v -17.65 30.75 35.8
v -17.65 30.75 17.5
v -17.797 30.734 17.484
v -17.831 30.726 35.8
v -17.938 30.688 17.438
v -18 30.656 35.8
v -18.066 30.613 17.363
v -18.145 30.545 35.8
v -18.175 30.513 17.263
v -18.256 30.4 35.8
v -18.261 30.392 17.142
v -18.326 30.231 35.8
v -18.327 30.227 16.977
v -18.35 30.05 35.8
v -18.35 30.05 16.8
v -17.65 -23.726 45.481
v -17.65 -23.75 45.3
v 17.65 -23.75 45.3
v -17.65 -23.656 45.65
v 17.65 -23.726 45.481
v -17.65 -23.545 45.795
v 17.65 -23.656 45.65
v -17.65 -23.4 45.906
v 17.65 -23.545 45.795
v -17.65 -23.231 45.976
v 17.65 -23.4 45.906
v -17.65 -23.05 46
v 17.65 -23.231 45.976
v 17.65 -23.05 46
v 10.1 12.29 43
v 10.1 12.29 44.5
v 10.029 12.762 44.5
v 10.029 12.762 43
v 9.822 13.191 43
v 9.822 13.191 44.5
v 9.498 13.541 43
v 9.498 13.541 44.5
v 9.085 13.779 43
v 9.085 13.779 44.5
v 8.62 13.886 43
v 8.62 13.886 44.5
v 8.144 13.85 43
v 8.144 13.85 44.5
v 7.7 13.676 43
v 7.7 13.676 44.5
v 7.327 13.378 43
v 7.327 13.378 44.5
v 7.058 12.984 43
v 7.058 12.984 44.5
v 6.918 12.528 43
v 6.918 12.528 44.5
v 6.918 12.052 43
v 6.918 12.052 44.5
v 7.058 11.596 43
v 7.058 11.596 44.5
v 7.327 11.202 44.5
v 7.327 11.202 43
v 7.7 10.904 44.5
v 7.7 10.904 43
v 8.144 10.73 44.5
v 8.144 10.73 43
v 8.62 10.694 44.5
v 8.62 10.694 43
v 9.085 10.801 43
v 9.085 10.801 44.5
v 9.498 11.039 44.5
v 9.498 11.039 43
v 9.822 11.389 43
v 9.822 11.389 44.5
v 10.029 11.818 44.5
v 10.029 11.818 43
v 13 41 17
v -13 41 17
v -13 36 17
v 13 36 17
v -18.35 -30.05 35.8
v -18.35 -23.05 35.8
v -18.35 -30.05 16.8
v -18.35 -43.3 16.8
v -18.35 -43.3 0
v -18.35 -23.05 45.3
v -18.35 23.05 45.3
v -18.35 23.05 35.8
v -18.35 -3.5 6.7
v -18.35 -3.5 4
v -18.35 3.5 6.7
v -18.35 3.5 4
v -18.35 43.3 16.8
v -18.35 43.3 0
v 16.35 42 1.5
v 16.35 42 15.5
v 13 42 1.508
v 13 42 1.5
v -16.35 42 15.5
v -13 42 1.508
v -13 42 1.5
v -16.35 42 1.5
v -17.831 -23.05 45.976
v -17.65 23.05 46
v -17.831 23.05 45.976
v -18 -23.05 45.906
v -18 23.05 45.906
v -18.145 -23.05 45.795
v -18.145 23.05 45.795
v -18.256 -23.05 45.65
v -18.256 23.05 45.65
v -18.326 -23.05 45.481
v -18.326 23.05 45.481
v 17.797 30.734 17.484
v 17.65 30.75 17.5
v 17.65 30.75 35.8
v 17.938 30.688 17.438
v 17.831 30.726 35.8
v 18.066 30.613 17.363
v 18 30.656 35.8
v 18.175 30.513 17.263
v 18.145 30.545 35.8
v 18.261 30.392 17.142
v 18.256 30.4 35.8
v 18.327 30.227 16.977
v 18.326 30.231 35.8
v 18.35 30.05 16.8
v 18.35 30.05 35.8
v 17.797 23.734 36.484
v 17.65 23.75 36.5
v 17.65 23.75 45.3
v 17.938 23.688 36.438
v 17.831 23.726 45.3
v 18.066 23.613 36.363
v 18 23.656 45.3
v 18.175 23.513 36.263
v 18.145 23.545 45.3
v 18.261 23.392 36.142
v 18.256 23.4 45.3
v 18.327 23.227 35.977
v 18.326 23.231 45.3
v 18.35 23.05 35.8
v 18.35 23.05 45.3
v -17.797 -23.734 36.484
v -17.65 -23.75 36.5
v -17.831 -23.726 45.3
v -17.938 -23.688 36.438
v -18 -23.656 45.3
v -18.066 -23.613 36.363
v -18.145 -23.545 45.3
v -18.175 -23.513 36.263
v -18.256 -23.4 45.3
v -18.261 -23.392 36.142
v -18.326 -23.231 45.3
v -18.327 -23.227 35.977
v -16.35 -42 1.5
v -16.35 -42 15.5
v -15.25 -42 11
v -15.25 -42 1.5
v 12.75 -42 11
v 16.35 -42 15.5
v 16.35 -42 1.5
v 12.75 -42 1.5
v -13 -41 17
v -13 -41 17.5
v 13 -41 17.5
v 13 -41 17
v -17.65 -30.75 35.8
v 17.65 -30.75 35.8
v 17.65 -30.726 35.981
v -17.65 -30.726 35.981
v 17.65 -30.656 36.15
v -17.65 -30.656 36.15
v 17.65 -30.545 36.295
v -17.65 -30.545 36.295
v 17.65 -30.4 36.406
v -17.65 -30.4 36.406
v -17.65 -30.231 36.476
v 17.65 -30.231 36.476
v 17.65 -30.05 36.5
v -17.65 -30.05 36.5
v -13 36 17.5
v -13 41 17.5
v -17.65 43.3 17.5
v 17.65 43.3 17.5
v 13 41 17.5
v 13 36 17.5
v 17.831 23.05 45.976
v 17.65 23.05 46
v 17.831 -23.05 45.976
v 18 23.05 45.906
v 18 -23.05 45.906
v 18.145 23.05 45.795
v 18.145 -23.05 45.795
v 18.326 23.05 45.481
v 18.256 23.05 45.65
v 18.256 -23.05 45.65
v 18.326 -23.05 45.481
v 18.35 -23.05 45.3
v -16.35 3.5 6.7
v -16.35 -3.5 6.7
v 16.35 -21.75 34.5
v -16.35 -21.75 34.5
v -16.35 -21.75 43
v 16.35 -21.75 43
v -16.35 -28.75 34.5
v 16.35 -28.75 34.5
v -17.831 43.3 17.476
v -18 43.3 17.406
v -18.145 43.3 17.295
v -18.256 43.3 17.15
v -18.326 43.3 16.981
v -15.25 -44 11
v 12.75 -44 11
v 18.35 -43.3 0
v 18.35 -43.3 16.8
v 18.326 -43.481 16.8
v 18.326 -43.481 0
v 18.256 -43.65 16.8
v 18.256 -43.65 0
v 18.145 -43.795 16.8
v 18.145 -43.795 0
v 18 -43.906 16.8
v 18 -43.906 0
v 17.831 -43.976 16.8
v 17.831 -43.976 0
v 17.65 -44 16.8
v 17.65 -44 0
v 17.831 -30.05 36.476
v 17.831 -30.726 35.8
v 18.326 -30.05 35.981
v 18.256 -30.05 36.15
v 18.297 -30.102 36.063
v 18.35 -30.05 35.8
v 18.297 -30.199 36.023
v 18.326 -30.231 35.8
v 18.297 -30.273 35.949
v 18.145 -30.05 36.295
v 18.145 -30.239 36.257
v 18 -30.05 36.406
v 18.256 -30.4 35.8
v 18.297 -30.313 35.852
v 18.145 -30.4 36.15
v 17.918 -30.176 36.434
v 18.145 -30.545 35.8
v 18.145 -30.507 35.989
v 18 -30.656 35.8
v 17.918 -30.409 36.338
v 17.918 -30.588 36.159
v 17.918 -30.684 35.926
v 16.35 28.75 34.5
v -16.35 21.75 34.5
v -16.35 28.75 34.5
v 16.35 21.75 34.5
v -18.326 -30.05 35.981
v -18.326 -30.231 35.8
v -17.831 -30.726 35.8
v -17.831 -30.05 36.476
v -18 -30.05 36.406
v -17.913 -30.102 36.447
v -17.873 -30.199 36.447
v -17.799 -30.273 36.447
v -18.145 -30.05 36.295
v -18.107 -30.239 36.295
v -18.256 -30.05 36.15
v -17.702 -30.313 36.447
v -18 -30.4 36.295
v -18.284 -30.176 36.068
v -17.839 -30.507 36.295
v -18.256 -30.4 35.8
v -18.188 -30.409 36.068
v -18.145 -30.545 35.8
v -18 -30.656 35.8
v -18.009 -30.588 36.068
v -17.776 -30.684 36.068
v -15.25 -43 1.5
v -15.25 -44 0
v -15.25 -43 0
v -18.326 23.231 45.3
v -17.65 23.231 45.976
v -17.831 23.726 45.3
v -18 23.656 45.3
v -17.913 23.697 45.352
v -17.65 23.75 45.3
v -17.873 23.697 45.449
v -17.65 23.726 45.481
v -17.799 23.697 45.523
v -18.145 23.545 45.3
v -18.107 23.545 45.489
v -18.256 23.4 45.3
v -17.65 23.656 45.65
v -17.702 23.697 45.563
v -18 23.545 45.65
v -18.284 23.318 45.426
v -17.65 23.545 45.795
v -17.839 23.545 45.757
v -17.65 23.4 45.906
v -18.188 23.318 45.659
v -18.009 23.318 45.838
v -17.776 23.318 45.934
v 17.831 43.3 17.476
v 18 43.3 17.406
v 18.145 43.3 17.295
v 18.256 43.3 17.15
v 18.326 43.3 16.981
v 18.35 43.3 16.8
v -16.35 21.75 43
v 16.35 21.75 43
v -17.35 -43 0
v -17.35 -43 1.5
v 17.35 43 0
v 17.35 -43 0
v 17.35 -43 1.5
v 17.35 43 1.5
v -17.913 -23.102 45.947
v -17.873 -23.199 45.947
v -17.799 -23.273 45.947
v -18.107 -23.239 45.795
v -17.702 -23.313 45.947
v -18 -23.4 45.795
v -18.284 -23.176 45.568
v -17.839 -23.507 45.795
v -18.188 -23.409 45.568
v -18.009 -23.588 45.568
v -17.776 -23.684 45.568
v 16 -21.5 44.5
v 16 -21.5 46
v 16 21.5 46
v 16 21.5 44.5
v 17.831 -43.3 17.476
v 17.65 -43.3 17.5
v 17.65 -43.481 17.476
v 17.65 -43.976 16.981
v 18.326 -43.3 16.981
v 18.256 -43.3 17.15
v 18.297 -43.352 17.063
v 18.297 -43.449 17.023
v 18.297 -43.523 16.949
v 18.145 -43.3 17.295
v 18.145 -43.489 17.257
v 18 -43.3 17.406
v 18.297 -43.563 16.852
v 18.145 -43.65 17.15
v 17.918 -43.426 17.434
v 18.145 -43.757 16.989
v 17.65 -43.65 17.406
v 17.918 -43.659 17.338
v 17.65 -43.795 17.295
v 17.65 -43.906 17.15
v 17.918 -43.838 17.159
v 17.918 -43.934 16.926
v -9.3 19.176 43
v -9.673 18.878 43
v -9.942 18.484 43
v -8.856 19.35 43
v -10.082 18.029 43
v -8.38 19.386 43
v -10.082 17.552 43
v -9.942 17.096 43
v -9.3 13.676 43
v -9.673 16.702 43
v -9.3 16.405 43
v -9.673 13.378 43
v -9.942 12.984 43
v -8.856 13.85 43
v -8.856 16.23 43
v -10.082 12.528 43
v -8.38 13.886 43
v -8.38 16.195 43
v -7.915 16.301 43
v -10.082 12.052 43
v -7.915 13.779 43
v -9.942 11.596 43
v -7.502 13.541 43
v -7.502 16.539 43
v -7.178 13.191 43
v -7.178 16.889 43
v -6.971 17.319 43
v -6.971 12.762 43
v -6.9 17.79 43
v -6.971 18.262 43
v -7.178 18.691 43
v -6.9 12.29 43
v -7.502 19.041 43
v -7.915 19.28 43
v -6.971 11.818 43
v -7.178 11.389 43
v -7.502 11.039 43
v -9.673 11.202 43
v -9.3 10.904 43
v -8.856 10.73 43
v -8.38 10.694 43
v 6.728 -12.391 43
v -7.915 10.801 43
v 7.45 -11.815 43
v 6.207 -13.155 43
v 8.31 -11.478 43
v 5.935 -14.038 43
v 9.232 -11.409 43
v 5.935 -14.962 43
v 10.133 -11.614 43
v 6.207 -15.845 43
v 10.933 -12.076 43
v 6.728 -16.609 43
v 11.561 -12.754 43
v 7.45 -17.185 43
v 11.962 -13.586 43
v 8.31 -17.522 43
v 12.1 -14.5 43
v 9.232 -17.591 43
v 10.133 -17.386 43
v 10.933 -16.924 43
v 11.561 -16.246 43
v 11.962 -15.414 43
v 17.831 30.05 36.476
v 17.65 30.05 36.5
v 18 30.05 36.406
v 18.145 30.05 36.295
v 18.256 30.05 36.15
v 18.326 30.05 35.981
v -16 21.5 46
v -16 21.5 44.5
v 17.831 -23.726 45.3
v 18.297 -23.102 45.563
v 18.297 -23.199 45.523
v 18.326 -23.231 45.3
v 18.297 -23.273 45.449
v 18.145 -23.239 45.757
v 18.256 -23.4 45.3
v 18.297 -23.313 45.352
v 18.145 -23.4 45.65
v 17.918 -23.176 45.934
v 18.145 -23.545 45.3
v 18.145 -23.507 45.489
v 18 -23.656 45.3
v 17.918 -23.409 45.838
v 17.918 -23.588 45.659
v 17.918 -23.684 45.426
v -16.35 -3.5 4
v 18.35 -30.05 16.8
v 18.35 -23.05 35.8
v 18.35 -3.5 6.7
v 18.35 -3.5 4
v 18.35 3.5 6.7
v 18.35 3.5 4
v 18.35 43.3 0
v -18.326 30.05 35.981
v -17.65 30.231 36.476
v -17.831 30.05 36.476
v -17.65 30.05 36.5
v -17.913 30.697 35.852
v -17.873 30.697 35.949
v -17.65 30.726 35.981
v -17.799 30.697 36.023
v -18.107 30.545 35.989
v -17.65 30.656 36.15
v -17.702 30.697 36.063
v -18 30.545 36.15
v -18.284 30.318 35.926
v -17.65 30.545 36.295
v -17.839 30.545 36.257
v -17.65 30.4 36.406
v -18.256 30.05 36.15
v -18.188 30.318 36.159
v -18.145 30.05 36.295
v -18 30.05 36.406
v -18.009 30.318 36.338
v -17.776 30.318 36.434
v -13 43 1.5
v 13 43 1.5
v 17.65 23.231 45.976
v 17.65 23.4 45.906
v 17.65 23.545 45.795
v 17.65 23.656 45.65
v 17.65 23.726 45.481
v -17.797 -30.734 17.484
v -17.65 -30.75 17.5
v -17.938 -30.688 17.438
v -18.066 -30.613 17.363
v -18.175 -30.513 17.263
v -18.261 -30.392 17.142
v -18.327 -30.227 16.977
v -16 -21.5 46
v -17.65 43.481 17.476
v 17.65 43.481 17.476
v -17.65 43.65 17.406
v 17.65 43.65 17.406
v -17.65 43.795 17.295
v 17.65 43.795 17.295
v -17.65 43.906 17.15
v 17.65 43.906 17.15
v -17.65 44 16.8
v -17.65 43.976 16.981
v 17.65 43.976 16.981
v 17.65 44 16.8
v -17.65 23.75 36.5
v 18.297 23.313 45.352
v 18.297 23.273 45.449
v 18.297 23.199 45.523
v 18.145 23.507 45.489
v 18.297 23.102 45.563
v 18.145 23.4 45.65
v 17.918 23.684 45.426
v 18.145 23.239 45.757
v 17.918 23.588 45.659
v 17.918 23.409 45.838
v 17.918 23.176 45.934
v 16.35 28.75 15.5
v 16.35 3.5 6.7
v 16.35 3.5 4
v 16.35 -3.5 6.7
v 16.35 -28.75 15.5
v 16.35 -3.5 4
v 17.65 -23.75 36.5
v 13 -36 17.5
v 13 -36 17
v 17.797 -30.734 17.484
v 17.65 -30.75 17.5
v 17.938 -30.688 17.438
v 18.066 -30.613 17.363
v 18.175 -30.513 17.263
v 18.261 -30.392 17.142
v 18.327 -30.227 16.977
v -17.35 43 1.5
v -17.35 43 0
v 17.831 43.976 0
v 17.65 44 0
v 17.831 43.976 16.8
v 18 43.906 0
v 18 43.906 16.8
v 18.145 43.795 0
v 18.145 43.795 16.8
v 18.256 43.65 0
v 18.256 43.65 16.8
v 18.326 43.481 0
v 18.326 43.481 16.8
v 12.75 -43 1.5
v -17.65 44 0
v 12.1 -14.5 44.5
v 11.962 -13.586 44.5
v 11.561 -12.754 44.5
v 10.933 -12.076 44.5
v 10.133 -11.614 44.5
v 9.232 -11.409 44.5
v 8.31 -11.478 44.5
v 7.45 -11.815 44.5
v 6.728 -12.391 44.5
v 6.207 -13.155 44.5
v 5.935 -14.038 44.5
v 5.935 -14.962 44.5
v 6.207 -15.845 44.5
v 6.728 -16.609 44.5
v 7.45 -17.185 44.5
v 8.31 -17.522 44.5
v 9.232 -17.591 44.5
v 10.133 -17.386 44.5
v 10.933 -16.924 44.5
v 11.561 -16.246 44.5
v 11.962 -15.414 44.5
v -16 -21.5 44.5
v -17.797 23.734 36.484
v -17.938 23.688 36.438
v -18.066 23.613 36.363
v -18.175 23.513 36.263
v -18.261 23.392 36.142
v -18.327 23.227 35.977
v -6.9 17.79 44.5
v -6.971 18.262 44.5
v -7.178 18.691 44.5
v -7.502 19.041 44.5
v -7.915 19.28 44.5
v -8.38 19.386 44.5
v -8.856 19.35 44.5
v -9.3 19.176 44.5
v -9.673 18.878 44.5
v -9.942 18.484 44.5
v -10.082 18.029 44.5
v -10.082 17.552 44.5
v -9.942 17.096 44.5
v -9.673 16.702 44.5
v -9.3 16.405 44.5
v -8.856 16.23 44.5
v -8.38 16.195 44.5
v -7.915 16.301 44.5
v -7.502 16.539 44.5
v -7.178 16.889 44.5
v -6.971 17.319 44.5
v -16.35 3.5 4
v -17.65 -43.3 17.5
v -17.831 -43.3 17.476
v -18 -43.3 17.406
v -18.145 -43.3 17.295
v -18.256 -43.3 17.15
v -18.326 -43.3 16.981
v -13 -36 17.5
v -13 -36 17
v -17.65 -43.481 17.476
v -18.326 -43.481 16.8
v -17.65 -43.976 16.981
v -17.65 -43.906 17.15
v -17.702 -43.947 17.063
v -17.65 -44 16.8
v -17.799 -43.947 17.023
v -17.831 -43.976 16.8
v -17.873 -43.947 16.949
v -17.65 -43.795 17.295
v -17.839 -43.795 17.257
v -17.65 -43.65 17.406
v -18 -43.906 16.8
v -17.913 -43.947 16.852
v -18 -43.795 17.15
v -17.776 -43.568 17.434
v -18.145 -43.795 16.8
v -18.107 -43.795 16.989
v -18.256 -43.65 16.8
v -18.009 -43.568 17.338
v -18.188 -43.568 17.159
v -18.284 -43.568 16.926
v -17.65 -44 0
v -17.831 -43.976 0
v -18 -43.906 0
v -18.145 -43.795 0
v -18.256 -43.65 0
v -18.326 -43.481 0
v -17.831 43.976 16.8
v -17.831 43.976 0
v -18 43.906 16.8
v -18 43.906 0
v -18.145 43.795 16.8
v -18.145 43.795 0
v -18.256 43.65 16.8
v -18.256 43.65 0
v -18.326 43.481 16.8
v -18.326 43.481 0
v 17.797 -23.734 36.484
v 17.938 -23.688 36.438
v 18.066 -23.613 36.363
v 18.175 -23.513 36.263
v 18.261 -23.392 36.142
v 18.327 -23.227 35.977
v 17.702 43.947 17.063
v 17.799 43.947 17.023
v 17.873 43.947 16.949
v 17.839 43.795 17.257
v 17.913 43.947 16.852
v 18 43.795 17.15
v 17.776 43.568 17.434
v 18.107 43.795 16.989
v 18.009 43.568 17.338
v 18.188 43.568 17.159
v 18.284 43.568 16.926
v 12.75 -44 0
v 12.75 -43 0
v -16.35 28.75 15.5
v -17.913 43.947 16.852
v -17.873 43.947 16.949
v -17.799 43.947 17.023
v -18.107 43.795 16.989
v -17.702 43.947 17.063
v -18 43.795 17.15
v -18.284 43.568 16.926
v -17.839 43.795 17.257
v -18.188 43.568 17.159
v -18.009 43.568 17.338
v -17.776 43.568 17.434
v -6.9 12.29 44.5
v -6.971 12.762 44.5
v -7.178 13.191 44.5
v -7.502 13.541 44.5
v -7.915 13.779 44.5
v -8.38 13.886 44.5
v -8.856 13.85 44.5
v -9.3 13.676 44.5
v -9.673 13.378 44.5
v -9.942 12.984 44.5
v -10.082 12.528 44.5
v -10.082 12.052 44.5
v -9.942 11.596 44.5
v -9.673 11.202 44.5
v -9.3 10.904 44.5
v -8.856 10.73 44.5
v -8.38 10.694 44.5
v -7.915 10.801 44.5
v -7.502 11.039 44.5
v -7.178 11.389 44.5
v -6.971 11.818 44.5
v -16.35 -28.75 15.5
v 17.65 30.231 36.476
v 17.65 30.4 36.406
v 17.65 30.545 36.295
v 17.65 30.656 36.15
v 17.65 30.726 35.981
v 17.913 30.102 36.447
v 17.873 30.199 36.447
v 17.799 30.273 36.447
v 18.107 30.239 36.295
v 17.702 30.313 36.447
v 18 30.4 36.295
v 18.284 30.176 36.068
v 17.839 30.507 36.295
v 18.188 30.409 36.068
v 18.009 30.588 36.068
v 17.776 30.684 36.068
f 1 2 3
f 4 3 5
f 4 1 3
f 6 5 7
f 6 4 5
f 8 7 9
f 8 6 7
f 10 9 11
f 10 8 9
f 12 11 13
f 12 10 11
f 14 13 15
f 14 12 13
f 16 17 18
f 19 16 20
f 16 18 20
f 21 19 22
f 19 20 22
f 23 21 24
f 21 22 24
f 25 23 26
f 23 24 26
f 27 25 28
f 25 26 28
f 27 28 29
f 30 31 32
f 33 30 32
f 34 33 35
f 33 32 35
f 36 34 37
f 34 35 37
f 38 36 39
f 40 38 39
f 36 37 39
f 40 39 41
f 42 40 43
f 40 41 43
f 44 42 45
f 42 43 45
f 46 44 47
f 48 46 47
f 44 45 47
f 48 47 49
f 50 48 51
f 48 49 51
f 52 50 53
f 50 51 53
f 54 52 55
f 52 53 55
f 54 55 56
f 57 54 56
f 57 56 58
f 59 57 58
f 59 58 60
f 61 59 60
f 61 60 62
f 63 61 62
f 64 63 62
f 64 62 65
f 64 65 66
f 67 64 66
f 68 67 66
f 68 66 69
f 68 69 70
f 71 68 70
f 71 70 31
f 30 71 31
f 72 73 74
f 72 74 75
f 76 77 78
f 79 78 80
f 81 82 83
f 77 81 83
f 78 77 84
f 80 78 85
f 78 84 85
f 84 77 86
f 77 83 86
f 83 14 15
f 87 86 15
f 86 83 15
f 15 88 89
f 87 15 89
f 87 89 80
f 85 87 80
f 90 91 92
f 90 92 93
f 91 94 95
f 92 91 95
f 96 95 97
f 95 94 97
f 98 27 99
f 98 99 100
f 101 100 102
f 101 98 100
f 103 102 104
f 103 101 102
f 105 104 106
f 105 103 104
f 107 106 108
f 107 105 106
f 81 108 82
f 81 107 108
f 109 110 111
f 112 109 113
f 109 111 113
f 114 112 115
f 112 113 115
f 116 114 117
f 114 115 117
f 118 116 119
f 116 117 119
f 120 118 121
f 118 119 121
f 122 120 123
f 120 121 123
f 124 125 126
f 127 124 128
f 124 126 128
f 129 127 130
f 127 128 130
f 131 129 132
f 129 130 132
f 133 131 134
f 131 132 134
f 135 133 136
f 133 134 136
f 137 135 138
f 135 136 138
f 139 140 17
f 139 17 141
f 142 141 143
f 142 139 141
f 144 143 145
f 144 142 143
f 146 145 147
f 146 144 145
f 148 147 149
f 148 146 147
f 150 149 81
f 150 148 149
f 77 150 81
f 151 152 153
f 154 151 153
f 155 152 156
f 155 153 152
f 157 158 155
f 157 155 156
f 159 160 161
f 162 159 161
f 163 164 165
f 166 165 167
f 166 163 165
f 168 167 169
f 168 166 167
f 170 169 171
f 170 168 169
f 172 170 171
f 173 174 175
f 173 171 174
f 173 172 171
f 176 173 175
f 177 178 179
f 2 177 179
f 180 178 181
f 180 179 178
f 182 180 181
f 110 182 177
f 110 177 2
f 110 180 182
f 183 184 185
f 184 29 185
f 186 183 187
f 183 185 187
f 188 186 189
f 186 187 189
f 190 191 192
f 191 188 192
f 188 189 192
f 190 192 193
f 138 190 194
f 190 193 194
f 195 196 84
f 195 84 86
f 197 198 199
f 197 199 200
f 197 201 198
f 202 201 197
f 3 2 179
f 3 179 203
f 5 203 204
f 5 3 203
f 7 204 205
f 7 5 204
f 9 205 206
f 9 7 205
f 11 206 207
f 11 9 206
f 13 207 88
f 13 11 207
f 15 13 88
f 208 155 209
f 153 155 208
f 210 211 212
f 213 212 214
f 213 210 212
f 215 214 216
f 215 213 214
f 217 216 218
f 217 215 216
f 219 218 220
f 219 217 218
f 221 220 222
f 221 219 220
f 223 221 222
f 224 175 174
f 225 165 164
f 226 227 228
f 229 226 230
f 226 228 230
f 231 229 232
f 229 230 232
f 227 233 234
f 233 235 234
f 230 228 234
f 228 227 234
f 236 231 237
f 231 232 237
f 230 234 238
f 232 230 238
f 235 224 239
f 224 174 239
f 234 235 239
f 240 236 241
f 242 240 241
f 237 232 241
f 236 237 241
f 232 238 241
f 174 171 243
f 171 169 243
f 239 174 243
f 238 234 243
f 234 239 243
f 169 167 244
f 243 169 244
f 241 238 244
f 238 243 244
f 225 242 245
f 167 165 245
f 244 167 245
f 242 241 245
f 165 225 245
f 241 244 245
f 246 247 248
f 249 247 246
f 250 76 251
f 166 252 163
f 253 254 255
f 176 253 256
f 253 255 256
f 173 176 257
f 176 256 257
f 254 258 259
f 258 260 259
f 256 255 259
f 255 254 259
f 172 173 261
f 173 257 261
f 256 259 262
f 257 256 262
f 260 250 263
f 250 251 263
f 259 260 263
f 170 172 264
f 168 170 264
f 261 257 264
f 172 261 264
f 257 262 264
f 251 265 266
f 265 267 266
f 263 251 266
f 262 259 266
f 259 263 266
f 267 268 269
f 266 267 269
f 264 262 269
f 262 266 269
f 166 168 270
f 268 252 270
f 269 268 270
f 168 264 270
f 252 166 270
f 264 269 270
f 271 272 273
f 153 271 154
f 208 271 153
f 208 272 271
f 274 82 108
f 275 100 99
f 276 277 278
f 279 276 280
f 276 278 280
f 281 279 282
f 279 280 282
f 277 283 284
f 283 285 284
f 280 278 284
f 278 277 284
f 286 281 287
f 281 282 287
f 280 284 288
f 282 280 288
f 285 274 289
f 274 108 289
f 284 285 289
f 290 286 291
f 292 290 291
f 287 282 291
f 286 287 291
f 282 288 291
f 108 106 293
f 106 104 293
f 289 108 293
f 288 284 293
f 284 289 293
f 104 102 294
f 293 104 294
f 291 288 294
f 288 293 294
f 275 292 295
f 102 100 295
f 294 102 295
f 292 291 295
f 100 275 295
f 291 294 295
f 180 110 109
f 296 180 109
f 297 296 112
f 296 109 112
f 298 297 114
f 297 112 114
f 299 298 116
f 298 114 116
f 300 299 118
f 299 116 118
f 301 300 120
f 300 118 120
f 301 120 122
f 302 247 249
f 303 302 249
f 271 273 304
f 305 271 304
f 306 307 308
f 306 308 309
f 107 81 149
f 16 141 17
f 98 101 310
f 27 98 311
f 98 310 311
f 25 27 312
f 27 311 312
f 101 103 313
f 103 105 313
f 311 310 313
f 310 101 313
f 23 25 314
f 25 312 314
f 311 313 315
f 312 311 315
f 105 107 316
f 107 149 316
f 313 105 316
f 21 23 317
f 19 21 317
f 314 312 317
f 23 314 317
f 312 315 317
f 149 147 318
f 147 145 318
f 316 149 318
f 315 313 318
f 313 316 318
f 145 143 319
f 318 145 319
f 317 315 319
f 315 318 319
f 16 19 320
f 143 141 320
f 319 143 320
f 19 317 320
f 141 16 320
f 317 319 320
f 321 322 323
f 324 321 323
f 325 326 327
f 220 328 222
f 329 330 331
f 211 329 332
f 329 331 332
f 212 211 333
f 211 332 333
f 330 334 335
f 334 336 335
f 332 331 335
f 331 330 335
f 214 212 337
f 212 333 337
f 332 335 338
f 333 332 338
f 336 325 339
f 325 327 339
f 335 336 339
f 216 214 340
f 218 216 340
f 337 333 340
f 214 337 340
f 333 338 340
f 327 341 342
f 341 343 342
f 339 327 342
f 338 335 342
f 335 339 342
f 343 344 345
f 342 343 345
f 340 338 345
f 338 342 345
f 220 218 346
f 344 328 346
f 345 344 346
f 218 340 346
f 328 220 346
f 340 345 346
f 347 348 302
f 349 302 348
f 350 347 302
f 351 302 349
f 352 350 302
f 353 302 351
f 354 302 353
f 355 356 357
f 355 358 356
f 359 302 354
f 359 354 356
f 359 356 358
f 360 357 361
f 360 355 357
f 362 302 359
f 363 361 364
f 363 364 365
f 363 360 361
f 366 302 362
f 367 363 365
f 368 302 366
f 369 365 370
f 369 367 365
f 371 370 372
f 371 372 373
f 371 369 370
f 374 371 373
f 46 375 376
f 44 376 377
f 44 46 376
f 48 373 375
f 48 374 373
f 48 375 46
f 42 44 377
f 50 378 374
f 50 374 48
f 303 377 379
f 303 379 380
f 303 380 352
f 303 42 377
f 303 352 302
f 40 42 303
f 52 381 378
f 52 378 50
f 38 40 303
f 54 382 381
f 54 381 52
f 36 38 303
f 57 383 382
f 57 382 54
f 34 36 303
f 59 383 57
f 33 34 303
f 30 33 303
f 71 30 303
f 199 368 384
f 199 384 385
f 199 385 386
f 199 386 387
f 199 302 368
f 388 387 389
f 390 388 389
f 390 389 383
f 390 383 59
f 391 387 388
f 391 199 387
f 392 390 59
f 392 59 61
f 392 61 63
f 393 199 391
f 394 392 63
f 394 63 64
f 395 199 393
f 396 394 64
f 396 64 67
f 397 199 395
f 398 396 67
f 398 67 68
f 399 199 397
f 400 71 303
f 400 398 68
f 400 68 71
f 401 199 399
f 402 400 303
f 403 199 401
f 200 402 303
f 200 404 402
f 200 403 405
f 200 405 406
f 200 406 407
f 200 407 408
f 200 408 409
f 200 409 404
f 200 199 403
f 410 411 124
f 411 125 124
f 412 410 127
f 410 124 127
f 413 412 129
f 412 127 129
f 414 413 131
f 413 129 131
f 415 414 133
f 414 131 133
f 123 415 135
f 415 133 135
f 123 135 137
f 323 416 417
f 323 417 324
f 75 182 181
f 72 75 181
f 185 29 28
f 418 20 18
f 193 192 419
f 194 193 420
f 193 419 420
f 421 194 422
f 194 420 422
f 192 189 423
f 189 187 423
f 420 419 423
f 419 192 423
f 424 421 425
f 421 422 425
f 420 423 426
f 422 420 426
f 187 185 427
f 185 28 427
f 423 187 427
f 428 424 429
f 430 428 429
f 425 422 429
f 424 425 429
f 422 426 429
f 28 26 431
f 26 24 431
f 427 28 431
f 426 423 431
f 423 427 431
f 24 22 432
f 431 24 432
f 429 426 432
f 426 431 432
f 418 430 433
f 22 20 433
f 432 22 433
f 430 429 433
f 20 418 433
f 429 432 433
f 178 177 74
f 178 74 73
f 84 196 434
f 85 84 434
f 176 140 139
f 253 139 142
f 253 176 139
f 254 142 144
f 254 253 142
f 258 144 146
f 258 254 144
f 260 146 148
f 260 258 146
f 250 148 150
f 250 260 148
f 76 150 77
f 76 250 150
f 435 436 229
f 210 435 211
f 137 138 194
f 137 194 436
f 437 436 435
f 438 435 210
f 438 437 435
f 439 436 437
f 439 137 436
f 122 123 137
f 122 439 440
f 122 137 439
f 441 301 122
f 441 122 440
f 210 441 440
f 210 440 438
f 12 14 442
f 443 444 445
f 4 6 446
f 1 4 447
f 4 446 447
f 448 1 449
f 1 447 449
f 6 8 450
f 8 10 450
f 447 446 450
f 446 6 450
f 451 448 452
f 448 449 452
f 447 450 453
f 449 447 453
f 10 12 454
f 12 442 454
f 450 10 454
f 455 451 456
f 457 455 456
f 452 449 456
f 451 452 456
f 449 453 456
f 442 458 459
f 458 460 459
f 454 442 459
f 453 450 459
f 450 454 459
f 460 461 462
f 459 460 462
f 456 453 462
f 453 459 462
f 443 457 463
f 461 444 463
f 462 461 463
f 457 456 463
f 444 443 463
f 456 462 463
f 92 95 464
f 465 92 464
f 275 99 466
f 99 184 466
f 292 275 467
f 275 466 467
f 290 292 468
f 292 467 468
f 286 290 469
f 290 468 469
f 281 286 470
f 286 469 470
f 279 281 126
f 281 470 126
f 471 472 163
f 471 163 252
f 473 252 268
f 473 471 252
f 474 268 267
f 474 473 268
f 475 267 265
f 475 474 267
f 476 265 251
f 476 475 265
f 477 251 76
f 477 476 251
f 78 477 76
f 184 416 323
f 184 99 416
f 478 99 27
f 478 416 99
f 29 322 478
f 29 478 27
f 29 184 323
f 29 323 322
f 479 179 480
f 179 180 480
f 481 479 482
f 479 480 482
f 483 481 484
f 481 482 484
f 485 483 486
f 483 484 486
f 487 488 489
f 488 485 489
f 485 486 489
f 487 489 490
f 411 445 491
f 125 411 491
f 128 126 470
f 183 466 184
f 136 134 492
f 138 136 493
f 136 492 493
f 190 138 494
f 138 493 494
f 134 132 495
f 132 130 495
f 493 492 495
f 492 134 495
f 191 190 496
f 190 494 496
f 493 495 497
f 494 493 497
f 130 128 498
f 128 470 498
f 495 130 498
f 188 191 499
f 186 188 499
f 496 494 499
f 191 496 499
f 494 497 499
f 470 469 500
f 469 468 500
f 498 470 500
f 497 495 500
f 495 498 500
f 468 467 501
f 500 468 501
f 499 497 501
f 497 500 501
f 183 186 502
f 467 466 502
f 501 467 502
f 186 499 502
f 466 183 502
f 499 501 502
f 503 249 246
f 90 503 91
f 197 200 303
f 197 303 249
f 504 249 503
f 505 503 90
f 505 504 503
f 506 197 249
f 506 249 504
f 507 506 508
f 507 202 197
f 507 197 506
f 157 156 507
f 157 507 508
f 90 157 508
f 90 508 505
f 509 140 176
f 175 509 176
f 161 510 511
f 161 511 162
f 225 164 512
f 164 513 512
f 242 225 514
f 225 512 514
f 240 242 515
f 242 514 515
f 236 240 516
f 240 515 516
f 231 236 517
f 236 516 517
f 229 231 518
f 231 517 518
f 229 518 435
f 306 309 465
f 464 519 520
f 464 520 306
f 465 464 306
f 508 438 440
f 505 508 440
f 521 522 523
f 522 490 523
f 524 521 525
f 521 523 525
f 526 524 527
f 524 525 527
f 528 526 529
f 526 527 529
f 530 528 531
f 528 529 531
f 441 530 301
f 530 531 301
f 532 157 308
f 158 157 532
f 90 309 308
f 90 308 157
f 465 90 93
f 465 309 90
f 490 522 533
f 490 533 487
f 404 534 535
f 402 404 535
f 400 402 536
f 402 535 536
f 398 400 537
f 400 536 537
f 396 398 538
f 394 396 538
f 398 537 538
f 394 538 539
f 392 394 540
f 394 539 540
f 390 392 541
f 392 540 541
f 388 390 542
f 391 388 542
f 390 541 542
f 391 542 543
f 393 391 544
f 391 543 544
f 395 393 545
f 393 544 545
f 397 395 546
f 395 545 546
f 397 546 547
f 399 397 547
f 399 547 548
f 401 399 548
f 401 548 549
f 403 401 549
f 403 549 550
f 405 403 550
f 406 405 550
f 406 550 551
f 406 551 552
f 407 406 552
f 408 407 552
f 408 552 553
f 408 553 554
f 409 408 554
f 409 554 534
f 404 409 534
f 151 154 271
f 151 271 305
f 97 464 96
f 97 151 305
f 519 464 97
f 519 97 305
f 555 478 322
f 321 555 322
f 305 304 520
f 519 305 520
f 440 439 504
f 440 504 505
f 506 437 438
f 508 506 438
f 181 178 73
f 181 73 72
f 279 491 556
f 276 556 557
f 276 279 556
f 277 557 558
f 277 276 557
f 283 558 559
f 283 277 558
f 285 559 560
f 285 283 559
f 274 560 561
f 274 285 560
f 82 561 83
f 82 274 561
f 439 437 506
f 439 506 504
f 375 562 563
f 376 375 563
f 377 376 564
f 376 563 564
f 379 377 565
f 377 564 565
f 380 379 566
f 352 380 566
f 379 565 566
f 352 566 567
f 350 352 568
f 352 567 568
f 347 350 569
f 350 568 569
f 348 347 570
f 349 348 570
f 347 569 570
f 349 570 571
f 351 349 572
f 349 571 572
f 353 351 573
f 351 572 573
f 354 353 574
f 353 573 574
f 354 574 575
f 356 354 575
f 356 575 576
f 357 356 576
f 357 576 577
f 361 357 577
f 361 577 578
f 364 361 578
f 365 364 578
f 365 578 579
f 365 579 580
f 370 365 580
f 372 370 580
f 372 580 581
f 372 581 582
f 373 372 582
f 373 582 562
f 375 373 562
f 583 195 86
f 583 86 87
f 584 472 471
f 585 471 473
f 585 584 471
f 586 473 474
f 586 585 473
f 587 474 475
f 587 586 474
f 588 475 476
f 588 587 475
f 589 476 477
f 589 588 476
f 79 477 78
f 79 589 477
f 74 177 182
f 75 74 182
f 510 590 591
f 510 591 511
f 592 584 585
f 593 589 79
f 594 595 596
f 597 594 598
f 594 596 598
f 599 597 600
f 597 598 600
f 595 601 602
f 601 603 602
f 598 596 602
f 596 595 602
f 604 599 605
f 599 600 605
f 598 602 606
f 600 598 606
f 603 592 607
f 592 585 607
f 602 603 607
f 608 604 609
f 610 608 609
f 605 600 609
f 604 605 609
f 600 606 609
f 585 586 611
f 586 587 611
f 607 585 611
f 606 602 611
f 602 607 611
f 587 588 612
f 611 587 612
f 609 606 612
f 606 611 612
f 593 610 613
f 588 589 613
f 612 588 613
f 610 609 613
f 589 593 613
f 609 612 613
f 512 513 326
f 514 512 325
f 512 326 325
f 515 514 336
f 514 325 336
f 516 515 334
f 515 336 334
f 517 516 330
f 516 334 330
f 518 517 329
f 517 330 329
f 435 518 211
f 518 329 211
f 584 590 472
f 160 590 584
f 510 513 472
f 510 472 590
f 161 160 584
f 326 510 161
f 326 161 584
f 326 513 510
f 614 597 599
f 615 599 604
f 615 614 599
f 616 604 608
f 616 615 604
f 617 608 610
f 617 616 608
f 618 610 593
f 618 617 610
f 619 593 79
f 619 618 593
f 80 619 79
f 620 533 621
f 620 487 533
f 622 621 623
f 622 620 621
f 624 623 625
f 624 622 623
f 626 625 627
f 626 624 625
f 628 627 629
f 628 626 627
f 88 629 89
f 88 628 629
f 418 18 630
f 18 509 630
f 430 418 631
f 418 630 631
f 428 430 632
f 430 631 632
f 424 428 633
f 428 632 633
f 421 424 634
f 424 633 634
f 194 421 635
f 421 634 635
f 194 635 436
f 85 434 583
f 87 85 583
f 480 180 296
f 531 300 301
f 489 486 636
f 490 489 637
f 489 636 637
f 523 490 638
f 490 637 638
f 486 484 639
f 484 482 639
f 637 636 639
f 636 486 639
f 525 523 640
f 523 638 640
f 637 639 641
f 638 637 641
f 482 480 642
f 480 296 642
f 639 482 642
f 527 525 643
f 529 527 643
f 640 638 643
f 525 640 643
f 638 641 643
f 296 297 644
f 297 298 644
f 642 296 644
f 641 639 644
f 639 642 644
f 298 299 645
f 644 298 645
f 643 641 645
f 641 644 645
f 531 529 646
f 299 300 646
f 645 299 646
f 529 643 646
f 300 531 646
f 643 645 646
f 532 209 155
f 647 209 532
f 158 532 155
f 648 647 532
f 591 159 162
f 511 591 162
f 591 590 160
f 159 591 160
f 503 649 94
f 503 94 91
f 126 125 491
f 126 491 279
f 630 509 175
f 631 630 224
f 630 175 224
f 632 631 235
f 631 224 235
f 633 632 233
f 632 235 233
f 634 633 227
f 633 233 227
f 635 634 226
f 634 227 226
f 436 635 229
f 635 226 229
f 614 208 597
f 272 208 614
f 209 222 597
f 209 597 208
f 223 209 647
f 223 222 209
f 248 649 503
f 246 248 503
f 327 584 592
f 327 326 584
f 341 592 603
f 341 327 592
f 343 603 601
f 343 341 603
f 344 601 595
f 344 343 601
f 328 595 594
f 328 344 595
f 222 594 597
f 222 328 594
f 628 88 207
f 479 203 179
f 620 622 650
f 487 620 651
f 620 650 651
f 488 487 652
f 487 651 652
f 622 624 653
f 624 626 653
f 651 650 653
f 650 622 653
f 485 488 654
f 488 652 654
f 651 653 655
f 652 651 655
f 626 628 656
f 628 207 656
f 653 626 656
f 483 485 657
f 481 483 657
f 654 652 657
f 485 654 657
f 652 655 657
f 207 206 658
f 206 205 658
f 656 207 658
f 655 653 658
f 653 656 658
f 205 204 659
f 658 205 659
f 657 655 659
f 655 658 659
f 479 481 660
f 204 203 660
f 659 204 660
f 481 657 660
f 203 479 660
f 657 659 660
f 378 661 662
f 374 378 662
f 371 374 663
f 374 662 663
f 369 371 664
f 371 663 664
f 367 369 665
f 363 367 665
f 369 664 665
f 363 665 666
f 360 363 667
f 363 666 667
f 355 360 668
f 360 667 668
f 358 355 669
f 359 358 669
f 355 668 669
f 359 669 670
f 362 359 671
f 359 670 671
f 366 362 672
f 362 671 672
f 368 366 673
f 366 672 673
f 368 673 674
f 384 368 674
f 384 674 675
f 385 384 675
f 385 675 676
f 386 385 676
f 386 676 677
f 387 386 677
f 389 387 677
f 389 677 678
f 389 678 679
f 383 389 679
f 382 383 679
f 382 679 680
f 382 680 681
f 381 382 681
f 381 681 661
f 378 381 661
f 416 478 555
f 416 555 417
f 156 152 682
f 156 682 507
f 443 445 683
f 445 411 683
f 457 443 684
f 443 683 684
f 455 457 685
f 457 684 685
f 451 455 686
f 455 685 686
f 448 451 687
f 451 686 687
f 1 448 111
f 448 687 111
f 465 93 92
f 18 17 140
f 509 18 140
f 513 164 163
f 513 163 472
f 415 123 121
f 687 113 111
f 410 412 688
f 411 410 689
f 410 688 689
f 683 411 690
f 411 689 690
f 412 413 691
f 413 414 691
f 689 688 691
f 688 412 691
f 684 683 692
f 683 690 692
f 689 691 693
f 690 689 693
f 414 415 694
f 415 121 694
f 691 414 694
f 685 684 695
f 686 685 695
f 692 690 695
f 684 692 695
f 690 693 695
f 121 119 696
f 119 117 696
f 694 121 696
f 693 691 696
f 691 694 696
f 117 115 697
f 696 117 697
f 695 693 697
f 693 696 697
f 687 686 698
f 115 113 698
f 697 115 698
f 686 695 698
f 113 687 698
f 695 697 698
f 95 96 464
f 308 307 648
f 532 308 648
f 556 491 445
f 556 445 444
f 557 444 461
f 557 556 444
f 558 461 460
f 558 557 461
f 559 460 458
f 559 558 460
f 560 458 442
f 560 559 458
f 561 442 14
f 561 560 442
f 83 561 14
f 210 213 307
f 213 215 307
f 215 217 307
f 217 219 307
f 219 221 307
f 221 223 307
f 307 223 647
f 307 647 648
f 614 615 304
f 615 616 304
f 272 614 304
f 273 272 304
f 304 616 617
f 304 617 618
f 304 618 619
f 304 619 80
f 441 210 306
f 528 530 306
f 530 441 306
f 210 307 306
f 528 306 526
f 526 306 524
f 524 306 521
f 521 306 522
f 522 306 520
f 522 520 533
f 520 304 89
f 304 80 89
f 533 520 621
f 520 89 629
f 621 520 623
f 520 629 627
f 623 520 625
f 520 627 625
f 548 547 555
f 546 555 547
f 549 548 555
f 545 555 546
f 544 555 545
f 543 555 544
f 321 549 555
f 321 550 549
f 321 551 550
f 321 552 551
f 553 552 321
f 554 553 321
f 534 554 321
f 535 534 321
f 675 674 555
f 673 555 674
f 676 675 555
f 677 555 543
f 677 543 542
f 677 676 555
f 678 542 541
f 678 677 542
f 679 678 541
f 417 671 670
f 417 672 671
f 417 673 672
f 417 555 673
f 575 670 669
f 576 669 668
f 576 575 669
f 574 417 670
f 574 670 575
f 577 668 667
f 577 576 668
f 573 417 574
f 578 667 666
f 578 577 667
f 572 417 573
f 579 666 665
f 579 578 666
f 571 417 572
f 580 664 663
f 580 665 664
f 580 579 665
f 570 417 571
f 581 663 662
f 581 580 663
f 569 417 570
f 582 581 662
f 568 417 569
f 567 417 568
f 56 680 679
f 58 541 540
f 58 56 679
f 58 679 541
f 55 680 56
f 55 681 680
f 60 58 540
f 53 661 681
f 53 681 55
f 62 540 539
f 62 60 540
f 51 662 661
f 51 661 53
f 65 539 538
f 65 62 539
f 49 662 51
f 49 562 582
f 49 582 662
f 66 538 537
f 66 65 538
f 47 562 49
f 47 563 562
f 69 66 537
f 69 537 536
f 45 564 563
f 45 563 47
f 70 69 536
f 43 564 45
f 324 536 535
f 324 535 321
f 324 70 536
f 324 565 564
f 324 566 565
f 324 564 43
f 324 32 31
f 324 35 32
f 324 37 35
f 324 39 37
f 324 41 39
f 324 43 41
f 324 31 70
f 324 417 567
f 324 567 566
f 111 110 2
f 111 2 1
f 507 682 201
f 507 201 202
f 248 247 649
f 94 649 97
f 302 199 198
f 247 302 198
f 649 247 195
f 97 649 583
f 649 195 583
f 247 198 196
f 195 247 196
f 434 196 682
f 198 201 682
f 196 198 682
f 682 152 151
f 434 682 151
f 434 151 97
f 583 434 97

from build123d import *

# Parameters (mm, degrees)
EXTRUDE_1_DEPTH      = 18.35
FILLET_1_R           = 0.7
SHELL_START          = -28.75
SHELL_1_OUTLINE_W    = 32.7
SHELL_1_OUTLINE_H    = 34.5
SHELL_1_DEPTH        = 57.5
SHELL_START_2        = -42
SHELL_1_2_OUTLINE_W  = 32.7
SHELL_1_2_OUTLINE_H  = 15.5
SHELL_1_2_DEPTH      = 84
SHELL_START_3        = -21.75
SHELL_1_3_OUTLINE_W  = 32.7
SHELL_1_3_OUTLINE_H  = 8.5
SHELL_1_3_DEPTH      = 43.5
SKETCH_2_W           = 32
SKETCH_2_H           = 43
CUT_EXTRUDE_1_DEPTH  = 1.5
SKETCH_7_W           = 25.5
SKETCH_7_H           = 2
SKETCH_7_W_2         = 26
CUT_EXTRUDE_5_DEPTH  = 11
SKETCH_8_W           = 2.7
SKETCH_8_H           = 7
CUT_EXTRUDE_6_DEPTH  = 36
SKETCH_9_W           = 26
SKETCH_9_H           = 5
CUT_EXTRUDE_7_DEPTH  = 0.5
SKETCH_10_W          = 34.7
SKETCH_10_H          = 86
SKETCH_10_W_2        = 32.7
SKETCH_10_H_2        = 84
CUT_EXTRUDE_8_DEPTH  = 1.5
SKETCH_11_W          = 2.5
SKETCH_11_H          = 11
CUT_EXTRUDE_9_DEPTH  = 2
SKETCH_12_R          = 1.6
SKETCH_12_R_2        = 3.1
CUT_EXTRUDE_10_DEPTH = 2
EXTRUDE_2_REACH      = 72.956


# Read off the part's stored shape, not the designer's step: Оболочка1
with BuildPart() as part:
    # Эскиз1 → Вытянуть1 (new, symmetric)
    with BuildSketch(Plane(origin=(0, 0, 0), x_dir=(0, 0, -1), z_dir=(1, 0, 0))):
        Polygon((-17.5, -30.75), (-17.5, -44), (0, -44), (0, 44), (-17.5, 44), (-17.5, 30.75), (-36.5, 30.75), (-36.5, 23.75), (-46, 23.75), (-46, -23.75), (-36.5, -23.75), (-36.5, -30.75), align=None)
    extrude(amount=EXTRUDE_1_DEPTH, both=True)

    # Скругление1
    fillet_1_edges = [part.edges().sort_by_distance(p)[0] for p in [
        (18.35, 37.375, 17.5),
        (-18.35, -37.375, 17.5),
        (-18.35, -30.75, 27),
        (-18.35, -27.25, 36.5),
        (-18.35, -23.75, 41.25),
        (-18.35, 0, 46),
        (-18.35, 23.75, 41.25),
        (-18.35, 27.25, 36.5),
        (-18.35, 30.75, 27),
        (18.35, 30.75, 27),
        (-18.35, 37.375, 17.5),
        (-18.35, 44, 8.75),
        (18.35, 27.25, 36.5),
        (0, -44, 17.5),
        (0, -30.75, 36.5),
        (0, -23.75, 46),
        (0, 23.75, 46),
        (18.35, 23.75, 41.25),
        (0, 30.75, 36.5),
        (0, 44, 17.5),
        (18.35, 0, 46),
        (18.35, -23.75, 41.25),
        (18.35, -27.25, 36.5),
        (18.35, -30.75, 27),
        (18.35, -37.375, 17.5),
        (18.35, -44, 8.75),
        (18.35, 44, 8.75),
        (-18.35, -44, 8.75),
    ]]
    fillet(fillet_1_edges, radius=FILLET_1_R)

    # Оболочка1 outline → Оболочка1 (cut)
    with BuildSketch(Plane(origin=(0, 0, 0), x_dir=(1, 0, 0), z_dir=(0, 1, 0)).offset(SHELL_START)):
        with Locations((0, -17.25)):
            Rectangle(SHELL_1_OUTLINE_W, SHELL_1_OUTLINE_H)
    extrude(amount=SHELL_1_DEPTH, mode=Mode.SUBTRACT)

    # Shell 1 2 outline → Shell 1 2 (cut)
    with BuildSketch(Plane(origin=(0, 0, 0), x_dir=(1, 0, 0), z_dir=(0, 1, 0)).offset(SHELL_START_2)):
        with Locations((0, -7.75)):
            Rectangle(SHELL_1_2_OUTLINE_W, SHELL_1_2_OUTLINE_H)
    extrude(amount=SHELL_1_2_DEPTH, mode=Mode.SUBTRACT)

    # Shell 1 3 outline → Shell 1 3 (cut)
    with BuildSketch(Plane(origin=(0, 0, 0), x_dir=(1, 0, 0), z_dir=(0, 1, 0)).offset(SHELL_START_3)):
        with Locations((0, -38.75)):
            Rectangle(SHELL_1_3_OUTLINE_W, SHELL_1_3_OUTLINE_H)
    extrude(amount=SHELL_1_3_DEPTH, mode=Mode.SUBTRACT)

    # Эскиз2 → Вырез-Вытянуть1 (cut)
    with BuildSketch(Plane.XY.offset(46)):
        Rectangle(SKETCH_2_W, SKETCH_2_H)
    extrude(amount=-CUT_EXTRUDE_1_DEPTH, mode=Mode.SUBTRACT)

    # Эскиз7 → Вырез-Вытянуть5 (cut)
    with BuildSketch(Plane(origin=(0, 0, 0), x_dir=(-1, 0, 0), z_dir=(0, 0, -1))):
        with Locations((0, -43)):
            Rectangle(SKETCH_7_W, SKETCH_7_H)
        with Locations((0, 43)):
            Rectangle(SKETCH_7_W_2, SKETCH_7_H)
    extrude(amount=-CUT_EXTRUDE_5_DEPTH, mode=Mode.SUBTRACT)

    # Эскиз8 → Вырез-Вытянуть6 (cut, symmetric)
    with BuildSketch(Plane(origin=(0, 0, 0), x_dir=(0, 0, -1), z_dir=(1, 0, 0))):
        with Locations((-5.35, 0)):
            Rectangle(SKETCH_8_W, SKETCH_8_H)
    extrude(amount=CUT_EXTRUDE_6_DEPTH, both=True, mode=Mode.SUBTRACT)

    # Эскиз9 → Вырез-Вытянуть7 (cut)
    with BuildSketch(Plane.XY.offset(17.5)):
        with Locations((0, 38.5)):
            Rectangle(SKETCH_9_W, SKETCH_9_H)
    cut_extrude_7 = extrude(amount=-CUT_EXTRUDE_7_DEPTH, mode=Mode.SUBTRACT)

    # Зеркальное отражение1: Вырез-Вытянуть7 across plane
    add(cut_extrude_7.mirror(Plane.ZX), mode=Mode.SUBTRACT)

    # Эскиз10 → Вырез-Вытянуть8 (cut)
    with BuildSketch(Plane(origin=(0, 0, 0), x_dir=(-1, 0, 0), z_dir=(0, 0, -1))):
        Rectangle(SKETCH_10_W, SKETCH_10_H)
        Rectangle(SKETCH_10_W_2, SKETCH_10_H_2, mode=Mode.SUBTRACT)
    extrude(amount=-CUT_EXTRUDE_8_DEPTH, mode=Mode.SUBTRACT)

    # Эскиз11 → Вырез-Вытянуть9 (cut)
    with BuildSketch(Plane.XZ.offset(44)):
        with Locations((-14, 5.5)):
            Rectangle(SKETCH_11_W, SKETCH_11_H)
    extrude(amount=-CUT_EXTRUDE_9_DEPTH, mode=Mode.SUBTRACT)

    # Эскиз12 → Вырез-Вытянуть10 (cut)
    with BuildSketch(Plane.XY.offset(44.5)):
        with Locations((-8.5, 17.790145453)):
            Circle(SKETCH_12_R)
        with Locations((-8.5, 12.29)):
            Circle(SKETCH_12_R)
        with Locations((8.5, 12.29)):
            Circle(SKETCH_12_R)
        with Locations((9, -14.5)):
            Circle(SKETCH_12_R_2)
    extrude(amount=-CUT_EXTRUDE_10_DEPTH, mode=Mode.SUBTRACT)

    # Эскиз13 → Вытянуть2 (add, up to next)
    with BuildSketch(Plane(origin=(-13, 0, 0), x_dir=(0, 0, -1), z_dir=(1, 0, 0)), mode=Mode.PRIVATE) as extrude_2_sk1:
        Polygon((-11, 44), (-11, 42), (-1.508482634, 42), (-1.5, 43), (0, 43), (0, 44), align=None)
    extrude_2_tool1 = extrude(extrude_2_sk1.sketch, amount=EXTRUDE_2_REACH, mode=Mode.PRIVATE) - part.part
    add(extrude_2_tool1.solids().sort_by_distance((-13, 43.036731, 5.84846))[0])


solid = part.part
